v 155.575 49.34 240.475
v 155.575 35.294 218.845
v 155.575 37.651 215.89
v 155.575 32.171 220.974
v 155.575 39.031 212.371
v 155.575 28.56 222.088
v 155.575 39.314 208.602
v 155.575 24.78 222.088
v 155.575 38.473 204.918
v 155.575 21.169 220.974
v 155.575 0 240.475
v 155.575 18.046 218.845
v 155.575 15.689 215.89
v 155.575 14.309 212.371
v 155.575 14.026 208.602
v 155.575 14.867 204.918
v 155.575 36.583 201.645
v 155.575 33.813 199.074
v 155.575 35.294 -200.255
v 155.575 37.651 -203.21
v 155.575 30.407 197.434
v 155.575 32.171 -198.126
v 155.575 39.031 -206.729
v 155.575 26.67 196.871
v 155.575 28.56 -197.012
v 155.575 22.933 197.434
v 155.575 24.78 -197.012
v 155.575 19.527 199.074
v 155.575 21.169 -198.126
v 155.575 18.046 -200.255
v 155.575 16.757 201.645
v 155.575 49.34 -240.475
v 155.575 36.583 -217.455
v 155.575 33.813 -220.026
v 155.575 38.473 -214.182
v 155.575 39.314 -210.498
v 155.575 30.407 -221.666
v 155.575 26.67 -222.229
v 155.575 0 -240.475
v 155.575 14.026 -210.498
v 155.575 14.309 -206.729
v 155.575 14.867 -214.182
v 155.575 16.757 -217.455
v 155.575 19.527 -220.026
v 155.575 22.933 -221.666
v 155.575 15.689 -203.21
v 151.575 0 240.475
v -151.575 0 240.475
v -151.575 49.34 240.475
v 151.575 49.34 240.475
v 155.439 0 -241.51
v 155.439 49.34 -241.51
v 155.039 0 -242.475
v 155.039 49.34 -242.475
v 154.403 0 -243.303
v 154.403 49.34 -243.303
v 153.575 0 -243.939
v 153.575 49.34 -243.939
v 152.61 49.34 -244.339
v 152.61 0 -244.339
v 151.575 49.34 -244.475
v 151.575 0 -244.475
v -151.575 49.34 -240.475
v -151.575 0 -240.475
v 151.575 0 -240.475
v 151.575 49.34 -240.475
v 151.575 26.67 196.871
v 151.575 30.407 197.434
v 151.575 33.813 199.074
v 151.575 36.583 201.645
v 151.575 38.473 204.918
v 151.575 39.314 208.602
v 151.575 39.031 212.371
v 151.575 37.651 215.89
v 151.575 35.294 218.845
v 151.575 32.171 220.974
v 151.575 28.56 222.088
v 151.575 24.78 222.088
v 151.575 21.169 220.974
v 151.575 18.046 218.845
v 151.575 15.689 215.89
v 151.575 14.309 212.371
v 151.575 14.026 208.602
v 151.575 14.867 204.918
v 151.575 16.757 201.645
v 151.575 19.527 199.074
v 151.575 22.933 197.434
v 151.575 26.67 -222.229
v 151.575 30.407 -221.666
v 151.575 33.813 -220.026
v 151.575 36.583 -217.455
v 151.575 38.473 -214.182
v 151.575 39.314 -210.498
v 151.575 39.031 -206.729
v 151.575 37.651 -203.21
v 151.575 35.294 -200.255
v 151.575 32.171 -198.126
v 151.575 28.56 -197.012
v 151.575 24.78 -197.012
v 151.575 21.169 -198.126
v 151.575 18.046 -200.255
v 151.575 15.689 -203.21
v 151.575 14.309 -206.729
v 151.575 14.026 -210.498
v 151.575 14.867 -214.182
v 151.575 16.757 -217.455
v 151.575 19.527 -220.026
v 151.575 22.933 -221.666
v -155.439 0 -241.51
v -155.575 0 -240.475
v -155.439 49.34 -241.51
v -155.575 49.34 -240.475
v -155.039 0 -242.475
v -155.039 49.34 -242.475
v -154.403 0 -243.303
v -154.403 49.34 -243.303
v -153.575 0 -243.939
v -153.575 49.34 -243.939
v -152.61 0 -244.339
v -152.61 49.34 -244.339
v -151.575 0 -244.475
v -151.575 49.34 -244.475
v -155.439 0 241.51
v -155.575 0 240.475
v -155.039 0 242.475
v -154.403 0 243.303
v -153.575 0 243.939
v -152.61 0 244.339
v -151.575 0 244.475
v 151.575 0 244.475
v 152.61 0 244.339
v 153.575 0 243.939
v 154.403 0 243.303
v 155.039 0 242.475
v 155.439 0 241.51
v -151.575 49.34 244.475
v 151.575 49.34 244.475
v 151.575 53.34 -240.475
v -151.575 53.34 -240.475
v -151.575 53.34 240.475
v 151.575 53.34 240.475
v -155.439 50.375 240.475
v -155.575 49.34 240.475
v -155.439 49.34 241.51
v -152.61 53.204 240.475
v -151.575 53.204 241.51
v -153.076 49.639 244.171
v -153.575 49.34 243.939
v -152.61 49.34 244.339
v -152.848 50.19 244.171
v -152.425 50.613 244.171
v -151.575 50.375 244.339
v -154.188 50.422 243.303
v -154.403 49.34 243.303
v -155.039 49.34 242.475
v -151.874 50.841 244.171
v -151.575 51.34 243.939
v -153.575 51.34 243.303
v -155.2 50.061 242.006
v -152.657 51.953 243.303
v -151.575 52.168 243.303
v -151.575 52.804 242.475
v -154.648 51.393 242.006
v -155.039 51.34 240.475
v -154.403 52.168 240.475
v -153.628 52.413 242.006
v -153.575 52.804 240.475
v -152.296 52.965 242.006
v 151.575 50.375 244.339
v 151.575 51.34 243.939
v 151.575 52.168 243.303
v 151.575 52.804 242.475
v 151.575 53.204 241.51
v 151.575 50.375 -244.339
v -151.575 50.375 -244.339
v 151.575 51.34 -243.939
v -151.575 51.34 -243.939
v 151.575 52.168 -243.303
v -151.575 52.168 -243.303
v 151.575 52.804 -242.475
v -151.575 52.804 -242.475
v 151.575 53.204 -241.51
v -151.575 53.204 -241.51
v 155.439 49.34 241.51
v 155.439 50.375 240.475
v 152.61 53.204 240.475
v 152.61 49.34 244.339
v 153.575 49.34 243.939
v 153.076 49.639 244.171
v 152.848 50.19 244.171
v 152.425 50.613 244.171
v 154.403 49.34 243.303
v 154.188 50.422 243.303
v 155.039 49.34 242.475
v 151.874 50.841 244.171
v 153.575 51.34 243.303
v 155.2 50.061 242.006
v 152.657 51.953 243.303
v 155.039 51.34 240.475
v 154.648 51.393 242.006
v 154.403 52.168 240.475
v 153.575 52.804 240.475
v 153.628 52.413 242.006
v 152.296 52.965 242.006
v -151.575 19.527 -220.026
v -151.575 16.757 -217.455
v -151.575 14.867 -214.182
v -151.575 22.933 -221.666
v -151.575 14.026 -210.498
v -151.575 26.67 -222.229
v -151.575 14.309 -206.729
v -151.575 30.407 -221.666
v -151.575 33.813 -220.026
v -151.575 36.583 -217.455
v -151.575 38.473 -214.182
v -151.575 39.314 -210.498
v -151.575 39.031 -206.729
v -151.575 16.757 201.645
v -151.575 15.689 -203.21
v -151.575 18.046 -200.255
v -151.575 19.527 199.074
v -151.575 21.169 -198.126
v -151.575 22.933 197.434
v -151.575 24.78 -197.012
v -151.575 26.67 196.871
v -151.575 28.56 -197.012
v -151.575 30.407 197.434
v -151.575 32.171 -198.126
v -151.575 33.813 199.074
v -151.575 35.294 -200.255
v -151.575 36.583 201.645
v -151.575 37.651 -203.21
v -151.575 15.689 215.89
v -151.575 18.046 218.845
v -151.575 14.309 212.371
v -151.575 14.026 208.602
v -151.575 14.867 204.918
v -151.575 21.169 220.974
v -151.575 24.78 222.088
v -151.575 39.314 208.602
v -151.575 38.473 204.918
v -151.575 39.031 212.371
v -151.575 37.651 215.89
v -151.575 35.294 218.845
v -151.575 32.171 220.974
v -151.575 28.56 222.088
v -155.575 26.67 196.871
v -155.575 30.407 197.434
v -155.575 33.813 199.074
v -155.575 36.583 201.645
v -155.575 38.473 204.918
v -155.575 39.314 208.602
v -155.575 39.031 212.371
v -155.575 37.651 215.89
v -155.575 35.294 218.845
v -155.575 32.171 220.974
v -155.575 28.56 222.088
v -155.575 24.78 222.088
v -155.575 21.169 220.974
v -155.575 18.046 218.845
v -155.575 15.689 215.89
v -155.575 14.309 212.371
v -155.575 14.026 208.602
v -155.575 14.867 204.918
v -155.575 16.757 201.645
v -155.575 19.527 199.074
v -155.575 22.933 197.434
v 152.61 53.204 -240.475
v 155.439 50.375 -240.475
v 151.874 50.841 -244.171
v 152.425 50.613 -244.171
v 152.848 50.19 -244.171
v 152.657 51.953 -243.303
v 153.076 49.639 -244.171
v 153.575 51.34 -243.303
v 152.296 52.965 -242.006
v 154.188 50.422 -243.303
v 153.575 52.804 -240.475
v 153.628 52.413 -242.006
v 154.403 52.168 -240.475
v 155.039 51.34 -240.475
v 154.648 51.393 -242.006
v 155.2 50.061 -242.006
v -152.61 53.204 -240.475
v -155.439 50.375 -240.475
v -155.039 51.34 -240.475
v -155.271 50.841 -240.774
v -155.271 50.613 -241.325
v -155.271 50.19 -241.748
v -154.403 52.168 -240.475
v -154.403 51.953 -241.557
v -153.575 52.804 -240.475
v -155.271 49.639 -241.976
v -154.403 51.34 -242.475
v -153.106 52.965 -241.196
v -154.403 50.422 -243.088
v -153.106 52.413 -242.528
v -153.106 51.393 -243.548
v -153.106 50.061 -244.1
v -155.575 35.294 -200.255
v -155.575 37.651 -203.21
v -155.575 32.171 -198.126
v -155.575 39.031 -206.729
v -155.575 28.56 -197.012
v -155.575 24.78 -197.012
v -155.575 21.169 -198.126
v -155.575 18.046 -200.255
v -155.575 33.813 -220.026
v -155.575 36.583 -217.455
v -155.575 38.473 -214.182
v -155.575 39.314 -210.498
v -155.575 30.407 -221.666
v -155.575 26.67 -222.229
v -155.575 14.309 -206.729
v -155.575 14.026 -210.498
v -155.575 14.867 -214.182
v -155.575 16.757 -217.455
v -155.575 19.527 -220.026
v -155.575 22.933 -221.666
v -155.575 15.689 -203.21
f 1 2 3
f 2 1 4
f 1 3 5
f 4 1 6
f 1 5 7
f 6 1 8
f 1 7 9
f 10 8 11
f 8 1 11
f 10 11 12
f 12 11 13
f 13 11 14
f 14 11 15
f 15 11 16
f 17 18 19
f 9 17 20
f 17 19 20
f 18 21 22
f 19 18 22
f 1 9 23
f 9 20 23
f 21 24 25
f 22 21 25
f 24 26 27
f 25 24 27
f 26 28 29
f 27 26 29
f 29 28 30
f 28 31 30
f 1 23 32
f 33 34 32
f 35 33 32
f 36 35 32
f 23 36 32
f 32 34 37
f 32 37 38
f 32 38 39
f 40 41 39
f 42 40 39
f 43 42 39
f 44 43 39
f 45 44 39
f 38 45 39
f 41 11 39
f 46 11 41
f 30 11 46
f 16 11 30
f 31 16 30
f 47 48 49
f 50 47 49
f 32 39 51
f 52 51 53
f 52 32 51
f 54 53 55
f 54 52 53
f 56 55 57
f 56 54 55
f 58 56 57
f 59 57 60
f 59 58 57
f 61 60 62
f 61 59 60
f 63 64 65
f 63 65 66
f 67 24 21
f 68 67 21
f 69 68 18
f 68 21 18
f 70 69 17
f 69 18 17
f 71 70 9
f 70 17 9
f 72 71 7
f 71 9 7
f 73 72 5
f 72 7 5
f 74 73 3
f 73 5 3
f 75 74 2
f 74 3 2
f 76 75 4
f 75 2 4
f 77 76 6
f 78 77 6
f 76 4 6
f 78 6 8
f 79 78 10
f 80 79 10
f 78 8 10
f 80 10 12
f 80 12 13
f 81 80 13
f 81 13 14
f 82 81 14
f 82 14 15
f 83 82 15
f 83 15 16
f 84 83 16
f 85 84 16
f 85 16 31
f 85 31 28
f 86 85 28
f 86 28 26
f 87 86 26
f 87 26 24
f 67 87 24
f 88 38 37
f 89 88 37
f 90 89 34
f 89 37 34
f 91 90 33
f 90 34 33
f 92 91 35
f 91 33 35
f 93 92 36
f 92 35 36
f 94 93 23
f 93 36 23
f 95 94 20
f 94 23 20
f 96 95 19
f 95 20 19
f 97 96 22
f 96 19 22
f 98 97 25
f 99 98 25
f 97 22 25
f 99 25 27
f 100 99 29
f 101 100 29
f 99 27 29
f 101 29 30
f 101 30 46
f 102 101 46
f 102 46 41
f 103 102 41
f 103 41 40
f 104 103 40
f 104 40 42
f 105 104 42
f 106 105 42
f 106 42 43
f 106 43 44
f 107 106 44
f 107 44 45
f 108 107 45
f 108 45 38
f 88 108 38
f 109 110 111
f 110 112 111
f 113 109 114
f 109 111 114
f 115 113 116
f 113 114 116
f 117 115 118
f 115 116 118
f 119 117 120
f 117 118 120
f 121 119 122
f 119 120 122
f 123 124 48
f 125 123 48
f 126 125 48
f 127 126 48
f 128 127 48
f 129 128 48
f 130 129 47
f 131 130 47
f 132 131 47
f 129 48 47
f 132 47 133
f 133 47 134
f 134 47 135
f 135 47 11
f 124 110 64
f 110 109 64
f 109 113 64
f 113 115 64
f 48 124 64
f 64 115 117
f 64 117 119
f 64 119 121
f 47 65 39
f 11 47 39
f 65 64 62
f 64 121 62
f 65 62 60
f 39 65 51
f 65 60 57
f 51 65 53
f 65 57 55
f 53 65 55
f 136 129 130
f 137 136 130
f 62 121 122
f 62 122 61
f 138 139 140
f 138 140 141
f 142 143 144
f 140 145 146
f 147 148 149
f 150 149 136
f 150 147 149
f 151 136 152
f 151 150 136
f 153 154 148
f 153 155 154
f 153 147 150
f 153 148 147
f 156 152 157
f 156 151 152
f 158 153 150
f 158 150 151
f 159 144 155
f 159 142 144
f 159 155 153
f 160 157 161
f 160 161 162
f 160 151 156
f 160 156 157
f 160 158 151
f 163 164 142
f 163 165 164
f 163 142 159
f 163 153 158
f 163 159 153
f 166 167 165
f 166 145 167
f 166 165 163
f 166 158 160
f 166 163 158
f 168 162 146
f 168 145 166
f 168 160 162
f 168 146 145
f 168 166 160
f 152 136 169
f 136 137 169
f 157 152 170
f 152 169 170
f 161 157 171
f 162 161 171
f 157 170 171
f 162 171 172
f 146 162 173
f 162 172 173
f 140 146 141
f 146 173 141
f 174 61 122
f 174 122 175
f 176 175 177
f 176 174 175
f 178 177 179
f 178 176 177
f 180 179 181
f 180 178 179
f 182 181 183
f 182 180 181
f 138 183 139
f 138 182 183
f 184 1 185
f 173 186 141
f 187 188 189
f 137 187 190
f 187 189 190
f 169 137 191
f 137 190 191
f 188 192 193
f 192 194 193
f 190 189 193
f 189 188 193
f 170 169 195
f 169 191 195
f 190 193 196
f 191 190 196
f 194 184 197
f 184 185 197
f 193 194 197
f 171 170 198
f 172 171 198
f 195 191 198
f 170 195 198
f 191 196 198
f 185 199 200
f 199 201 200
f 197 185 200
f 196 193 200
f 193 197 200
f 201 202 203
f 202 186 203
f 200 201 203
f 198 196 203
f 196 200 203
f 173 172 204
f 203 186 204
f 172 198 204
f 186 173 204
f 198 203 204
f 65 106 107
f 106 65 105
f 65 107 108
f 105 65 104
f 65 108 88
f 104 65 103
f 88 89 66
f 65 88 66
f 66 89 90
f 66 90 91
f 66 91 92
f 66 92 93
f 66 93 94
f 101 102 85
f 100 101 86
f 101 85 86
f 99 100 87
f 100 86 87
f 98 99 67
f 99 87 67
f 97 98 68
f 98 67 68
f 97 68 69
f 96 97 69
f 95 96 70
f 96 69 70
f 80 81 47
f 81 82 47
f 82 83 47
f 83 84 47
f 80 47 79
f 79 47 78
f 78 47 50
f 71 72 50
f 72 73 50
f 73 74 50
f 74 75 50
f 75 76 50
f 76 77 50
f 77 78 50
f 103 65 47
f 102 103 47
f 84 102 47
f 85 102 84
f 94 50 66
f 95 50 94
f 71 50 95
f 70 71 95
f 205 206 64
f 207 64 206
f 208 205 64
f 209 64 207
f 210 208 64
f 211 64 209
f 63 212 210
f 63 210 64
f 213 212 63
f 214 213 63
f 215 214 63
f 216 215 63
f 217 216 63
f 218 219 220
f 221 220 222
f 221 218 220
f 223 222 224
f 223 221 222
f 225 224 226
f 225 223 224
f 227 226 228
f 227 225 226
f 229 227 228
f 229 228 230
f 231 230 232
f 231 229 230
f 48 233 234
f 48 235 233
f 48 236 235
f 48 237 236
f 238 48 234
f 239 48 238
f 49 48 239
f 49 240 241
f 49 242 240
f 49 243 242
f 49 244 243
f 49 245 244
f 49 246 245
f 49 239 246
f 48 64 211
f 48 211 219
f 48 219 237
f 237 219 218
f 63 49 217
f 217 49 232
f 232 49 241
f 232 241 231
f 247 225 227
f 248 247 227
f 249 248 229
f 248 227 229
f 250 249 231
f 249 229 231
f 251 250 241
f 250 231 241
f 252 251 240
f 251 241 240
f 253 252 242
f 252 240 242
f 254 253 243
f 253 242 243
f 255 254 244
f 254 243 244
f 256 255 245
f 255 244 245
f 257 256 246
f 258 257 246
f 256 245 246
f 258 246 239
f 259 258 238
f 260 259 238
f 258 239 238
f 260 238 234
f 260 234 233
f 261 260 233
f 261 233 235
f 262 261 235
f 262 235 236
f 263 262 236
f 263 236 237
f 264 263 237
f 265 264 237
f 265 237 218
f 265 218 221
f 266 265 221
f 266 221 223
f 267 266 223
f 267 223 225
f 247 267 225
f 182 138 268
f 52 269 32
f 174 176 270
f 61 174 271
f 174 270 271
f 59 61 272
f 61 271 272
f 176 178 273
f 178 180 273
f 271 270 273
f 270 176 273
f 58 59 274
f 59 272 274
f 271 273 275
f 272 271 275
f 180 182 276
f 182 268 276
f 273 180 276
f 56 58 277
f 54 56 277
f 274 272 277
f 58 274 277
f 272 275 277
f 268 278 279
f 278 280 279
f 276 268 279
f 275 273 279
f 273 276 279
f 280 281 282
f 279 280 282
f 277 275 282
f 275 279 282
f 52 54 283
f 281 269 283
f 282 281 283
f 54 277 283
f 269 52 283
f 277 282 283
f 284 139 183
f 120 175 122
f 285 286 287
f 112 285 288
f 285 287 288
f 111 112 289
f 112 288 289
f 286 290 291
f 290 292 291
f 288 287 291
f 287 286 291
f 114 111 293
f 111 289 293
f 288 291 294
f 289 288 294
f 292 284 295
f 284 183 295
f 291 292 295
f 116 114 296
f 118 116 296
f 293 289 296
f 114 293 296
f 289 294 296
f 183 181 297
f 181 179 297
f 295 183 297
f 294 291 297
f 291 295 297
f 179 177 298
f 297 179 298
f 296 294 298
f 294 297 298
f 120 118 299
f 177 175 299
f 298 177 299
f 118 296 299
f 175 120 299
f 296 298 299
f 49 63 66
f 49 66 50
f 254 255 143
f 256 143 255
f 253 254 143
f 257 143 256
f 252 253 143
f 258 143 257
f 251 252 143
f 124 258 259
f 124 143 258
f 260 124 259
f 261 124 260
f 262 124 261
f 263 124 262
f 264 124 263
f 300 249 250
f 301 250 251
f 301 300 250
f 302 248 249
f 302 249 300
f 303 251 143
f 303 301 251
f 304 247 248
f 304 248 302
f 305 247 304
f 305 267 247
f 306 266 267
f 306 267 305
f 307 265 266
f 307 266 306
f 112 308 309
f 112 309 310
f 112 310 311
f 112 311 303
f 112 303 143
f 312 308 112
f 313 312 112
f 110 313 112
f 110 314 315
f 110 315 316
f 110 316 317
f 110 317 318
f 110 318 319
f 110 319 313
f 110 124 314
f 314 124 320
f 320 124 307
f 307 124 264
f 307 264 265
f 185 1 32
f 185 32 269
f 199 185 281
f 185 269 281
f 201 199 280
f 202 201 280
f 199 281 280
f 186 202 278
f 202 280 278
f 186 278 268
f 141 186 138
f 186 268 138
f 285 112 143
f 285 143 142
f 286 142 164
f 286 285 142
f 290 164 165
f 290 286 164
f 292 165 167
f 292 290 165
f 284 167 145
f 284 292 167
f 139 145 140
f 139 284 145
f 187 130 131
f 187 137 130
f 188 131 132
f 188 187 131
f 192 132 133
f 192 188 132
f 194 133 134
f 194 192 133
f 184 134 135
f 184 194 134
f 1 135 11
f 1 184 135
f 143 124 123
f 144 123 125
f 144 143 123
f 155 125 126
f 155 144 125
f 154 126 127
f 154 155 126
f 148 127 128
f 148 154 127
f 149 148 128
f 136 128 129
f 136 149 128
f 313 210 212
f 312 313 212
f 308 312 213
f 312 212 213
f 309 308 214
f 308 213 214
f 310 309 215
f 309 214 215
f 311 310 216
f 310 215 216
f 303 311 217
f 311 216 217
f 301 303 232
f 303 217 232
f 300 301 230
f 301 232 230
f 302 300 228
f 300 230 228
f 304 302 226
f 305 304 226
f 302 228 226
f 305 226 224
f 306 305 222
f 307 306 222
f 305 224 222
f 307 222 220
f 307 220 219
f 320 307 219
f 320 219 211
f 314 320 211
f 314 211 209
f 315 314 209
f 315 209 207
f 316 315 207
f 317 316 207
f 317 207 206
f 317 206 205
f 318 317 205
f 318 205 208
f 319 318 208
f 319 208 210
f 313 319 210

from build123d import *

# Parameters (mm, degrees)
SKETCH1_W           = 311.15
SKETCH1_H           = 488.95
BOSS_EXTRUDE1_DEPTH = 53.34
FILLET1_R           = 4
SHELL1_START        = -151.575
SHELL1_OUTLINE_W    = 49.34
SHELL1_OUTLINE_H    = 480.95
SHELL1_DEPTH        = 303.15
SKETCH2_R           = 12.67938946
CUT_EXTRUDE1_DEPTH  = 400.283738368


# Read off the part's stored shape, not the designer's step: Shell1
with BuildPart() as part:
    # Sketch1 → Boss-Extrude1 (new body)
    with BuildSketch(Plane(origin=(0, 0, 0), x_dir=(1, 0, 0), z_dir=(0, 1, 0))):
        Rectangle(SKETCH1_W, SKETCH1_H)
    extrude(amount=BOSS_EXTRUDE1_DEPTH)

    # Fillet1
    fillet1_edges = [part.edges().sort_by_distance(p)[0] for p in [
        (155.575, 53.34, 0),
        (0, 53.34, -244.475),
        (-155.575, 53.34, 0),
        (-155.575, 26.67, -244.475),
        (155.575, 26.67, -244.475),
        (155.575, 26.67, 244.475),
        (-155.575, 26.67, 244.475),
        (0, 53.34, 244.475),
    ]]
    fillet(fillet1_edges, radius=FILLET1_R)

    # Shell1 outline → Shell1 (cut)
    with BuildSketch(Plane.YZ.offset(SHELL1_START)):
        with Locations((24.67, 0)):
            Rectangle(SHELL1_OUTLINE_W, SHELL1_OUTLINE_H)
    extrude(amount=SHELL1_DEPTH, mode=Mode.SUBTRACT)

    # Sketch2 → Cut-Extrude1 (cut, through all)
    with BuildSketch(Plane(origin=(155.575, 0, 0), x_dir=(0, 0, -1), z_dir=(1, 0, 0))):
        with Locations((-209.55, 26.67)):
            Circle(SKETCH2_R)
        with Locations((209.55, 26.67)):
            Circle(SKETCH2_R)
    extrude(amount=-CUT_EXTRUDE1_DEPTH, mode=Mode.SUBTRACT)


solid = part.part
